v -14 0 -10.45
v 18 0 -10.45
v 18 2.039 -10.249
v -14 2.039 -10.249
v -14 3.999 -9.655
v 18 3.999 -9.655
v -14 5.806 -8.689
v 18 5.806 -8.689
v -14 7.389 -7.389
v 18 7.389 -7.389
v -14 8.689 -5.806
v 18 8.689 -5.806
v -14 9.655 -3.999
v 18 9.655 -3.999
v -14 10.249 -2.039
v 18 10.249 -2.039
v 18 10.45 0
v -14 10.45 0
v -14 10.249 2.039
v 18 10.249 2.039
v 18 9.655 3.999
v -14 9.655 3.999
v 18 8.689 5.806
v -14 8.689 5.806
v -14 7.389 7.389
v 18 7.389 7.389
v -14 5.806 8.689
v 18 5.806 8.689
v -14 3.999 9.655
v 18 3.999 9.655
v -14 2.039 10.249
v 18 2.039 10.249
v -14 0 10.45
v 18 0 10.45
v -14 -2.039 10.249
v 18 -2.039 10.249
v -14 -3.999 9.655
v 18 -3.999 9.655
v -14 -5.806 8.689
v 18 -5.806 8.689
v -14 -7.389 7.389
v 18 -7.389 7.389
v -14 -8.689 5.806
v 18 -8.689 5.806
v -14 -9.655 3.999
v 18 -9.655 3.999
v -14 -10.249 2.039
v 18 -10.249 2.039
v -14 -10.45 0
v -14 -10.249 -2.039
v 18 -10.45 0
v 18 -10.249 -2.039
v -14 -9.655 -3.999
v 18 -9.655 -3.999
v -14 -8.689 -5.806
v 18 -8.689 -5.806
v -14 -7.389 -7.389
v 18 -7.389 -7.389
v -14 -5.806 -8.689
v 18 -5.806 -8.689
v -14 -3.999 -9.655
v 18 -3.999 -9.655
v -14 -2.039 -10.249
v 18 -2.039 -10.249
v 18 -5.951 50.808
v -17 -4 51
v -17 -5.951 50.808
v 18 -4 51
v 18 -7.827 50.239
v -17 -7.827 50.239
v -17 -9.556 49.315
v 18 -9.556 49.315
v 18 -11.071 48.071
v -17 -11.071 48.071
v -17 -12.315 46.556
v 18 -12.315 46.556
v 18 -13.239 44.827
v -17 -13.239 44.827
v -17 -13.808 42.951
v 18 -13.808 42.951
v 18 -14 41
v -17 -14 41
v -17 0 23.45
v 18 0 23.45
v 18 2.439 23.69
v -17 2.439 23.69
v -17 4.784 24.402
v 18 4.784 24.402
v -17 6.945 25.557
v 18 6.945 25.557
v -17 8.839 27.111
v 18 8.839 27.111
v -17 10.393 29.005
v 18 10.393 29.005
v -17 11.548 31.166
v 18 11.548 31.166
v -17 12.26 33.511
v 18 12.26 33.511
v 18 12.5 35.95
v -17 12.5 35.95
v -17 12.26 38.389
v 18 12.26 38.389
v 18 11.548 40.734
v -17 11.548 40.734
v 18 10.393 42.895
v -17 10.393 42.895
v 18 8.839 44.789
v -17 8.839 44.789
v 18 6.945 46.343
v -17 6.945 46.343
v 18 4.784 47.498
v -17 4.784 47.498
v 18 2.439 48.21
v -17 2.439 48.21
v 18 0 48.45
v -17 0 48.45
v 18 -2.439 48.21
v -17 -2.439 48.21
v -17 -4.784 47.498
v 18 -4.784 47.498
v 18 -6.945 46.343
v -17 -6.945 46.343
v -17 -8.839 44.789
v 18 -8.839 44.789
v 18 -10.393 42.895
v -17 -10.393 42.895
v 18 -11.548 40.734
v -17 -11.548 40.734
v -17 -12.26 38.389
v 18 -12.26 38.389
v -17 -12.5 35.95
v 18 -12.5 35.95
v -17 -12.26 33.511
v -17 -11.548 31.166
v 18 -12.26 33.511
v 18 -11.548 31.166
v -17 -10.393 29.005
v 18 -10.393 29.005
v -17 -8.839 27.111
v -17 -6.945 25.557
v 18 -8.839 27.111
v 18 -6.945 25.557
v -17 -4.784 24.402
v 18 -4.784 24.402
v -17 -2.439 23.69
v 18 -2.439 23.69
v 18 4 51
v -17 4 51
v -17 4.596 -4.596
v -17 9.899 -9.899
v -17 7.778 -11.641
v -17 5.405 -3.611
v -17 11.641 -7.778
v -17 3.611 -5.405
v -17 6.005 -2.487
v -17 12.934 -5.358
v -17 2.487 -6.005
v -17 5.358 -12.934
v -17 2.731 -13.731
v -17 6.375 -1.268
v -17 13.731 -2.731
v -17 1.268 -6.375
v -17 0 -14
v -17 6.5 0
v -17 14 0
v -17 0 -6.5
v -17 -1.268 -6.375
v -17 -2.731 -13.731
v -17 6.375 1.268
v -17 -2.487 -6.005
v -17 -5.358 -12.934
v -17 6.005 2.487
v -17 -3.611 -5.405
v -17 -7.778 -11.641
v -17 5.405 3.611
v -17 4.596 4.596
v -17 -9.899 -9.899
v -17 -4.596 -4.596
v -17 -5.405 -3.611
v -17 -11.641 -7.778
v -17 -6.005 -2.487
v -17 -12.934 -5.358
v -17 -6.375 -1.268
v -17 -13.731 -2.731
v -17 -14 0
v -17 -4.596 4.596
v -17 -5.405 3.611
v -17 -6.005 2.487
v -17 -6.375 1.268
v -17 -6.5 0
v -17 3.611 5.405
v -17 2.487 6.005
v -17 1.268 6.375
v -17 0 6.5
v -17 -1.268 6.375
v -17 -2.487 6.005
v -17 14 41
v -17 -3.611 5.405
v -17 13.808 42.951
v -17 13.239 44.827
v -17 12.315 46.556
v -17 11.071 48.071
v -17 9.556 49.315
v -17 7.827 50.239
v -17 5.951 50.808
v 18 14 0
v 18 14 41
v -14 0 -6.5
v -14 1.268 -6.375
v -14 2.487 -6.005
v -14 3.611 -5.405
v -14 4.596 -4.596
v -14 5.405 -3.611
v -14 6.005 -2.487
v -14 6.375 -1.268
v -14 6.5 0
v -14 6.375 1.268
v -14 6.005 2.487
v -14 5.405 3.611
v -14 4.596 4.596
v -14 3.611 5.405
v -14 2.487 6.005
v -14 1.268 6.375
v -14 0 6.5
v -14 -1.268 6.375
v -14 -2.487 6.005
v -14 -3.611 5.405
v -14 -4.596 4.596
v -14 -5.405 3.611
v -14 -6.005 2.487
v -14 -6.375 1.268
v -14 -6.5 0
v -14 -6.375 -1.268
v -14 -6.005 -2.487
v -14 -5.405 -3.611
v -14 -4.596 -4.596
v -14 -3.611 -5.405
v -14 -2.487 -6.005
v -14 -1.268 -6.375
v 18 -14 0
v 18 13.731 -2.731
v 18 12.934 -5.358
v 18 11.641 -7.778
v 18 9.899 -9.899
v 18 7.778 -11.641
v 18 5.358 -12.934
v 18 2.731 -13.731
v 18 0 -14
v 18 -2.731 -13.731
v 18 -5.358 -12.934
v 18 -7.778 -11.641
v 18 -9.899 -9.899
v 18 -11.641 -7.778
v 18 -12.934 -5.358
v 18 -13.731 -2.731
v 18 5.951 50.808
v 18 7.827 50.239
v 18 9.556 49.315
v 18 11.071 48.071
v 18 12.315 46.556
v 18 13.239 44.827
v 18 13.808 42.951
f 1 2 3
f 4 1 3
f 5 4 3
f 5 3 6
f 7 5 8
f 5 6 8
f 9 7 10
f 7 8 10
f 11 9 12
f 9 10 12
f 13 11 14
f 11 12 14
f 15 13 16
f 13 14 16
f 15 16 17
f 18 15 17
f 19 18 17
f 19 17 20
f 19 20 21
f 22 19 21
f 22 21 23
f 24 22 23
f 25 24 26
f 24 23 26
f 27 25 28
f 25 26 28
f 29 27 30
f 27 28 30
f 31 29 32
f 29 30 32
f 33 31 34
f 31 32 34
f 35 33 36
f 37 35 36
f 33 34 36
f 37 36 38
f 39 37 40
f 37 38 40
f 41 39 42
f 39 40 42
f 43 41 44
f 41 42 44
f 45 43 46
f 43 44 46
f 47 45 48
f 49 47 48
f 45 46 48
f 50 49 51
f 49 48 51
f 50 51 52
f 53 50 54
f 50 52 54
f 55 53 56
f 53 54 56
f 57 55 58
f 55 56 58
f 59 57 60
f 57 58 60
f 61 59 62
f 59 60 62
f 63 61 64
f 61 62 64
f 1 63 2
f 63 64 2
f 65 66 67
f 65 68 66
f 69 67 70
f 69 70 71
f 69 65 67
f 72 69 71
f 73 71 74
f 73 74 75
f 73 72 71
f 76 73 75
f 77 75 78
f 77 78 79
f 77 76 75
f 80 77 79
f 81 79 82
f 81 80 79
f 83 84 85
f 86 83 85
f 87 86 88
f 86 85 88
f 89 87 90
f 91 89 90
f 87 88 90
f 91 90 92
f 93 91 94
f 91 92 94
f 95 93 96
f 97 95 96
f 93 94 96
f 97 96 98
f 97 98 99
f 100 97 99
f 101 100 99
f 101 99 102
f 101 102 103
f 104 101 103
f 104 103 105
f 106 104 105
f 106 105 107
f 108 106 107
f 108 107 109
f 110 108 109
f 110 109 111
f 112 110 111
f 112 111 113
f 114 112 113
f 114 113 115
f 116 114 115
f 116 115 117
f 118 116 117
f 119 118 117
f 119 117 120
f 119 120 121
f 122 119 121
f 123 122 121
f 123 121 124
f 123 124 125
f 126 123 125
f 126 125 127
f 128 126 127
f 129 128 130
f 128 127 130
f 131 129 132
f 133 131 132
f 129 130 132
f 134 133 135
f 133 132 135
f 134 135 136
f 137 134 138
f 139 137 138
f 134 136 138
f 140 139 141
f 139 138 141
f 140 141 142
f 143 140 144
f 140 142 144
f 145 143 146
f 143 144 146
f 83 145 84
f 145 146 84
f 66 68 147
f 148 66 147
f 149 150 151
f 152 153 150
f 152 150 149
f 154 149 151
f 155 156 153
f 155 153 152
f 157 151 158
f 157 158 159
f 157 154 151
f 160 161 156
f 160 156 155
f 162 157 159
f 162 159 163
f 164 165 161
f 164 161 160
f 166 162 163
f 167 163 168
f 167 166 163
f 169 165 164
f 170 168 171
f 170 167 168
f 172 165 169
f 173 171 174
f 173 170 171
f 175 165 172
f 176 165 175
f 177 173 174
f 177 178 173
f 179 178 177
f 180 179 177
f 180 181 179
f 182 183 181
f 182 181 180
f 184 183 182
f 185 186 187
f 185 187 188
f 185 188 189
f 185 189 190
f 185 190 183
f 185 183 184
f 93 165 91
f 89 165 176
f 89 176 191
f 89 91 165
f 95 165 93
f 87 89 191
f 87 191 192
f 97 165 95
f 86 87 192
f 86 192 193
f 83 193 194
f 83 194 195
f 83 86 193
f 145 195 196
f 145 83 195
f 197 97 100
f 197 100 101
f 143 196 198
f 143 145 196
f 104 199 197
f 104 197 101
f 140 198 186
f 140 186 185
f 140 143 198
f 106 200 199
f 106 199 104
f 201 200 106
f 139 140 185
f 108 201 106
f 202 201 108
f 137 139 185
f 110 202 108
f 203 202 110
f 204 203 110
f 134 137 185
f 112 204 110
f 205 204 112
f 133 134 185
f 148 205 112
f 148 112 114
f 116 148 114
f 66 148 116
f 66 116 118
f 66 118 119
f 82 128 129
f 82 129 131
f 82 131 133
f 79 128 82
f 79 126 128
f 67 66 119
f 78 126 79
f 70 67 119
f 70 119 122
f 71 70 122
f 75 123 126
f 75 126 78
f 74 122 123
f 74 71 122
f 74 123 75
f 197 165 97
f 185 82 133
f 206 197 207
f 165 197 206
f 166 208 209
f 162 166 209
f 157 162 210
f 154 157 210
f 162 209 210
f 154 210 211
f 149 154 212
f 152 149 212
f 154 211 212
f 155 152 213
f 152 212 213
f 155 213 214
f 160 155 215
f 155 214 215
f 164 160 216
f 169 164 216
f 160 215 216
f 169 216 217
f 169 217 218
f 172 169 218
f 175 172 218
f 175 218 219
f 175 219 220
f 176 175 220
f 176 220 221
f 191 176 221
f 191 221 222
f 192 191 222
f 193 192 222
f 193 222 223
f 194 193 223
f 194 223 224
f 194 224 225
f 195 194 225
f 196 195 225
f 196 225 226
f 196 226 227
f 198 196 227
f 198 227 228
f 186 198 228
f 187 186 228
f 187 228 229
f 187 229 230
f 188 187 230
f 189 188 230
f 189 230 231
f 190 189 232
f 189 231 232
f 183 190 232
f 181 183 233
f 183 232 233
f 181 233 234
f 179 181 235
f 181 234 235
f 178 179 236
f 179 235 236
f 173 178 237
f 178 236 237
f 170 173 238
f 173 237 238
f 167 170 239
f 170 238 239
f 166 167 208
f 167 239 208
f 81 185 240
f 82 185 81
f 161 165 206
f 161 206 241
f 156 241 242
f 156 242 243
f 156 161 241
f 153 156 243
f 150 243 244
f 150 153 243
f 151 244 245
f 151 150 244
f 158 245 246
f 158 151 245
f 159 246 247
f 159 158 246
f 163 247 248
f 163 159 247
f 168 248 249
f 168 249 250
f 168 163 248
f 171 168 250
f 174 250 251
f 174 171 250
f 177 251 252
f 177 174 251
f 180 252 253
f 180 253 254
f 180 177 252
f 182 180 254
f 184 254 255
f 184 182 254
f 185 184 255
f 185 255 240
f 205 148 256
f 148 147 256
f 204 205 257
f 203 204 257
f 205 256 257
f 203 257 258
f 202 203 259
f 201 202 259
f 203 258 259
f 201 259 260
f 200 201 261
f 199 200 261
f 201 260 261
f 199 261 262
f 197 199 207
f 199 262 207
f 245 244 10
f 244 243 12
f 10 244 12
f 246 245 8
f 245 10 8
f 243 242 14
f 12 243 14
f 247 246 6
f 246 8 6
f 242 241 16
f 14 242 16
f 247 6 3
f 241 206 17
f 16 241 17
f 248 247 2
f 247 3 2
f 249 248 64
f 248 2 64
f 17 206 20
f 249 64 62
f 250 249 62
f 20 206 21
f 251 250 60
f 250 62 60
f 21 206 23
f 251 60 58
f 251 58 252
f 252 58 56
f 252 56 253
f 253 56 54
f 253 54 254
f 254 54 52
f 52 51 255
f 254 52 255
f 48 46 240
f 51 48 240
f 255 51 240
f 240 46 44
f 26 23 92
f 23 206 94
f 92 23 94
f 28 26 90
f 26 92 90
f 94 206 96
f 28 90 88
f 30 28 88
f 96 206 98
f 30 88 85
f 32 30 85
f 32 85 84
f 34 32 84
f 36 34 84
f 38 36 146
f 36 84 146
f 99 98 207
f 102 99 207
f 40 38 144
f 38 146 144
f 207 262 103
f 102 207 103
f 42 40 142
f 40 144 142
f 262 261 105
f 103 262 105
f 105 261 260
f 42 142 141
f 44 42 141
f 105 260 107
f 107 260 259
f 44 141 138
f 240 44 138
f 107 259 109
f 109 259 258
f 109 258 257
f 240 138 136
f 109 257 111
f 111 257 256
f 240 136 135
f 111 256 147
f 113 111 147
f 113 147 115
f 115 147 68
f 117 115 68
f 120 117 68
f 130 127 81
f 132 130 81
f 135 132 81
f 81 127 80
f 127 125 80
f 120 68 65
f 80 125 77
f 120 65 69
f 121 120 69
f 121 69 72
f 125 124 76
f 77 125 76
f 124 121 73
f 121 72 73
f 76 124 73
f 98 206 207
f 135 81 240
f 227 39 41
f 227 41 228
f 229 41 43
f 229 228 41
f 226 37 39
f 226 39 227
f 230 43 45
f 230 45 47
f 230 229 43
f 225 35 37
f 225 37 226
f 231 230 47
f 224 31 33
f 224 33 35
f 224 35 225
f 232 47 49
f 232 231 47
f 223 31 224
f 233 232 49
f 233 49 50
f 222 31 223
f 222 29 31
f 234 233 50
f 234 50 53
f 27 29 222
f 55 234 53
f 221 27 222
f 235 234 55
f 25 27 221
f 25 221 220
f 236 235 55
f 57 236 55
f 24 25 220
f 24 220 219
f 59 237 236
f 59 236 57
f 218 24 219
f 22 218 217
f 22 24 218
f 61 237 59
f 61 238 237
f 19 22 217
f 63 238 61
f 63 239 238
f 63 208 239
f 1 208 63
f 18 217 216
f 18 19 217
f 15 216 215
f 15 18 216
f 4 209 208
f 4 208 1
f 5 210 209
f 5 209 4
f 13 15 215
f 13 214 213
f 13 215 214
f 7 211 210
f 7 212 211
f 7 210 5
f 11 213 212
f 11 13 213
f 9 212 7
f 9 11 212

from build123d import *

# Parameters (mm, degrees)
BOSS_EXTRUDE1_START = -17
BOSS_EXTRUDE1_DEPTH = 35
SKETCH2_R           = 10.45
CUT_EXTRUDE1_DEPTH  = 32
SKETCH3_R           = 6.5
CUT_EXTRUDE2_DEPTH  = 62.814237842
SKETCH4_R           = 12.5
CUT_EXTRUDE3_DEPTH  = 64.419239983
FILLET5_R           = 10
FILLET6_R           = 10


with BuildPart() as part:
    # Sketch1 → Boss-Extrude1 (new body)
    with BuildSketch(Plane.YZ.offset(BOSS_EXTRUDE1_START)):
        with BuildLine():
            Line((-14, 0), (-14, 51))
            Line((-14, 51), (14, 51))
            Line((14, 51), (14, 0))
            ThreePointArc((14, 0), (0, -14), (-14, 0))
        make_face()
    extrude(amount=BOSS_EXTRUDE1_DEPTH)

    # Sketch2 → Cut-Extrude1 (cut)
    with BuildSketch(Plane.YZ.offset(18)):
        with Locations(Location((0, 0, 0), (0, 0, 270))):
            Circle(SKETCH2_R)
    extrude(amount=-CUT_EXTRUDE1_DEPTH, mode=Mode.SUBTRACT)

    # Sketch3 → Cut-Extrude2 (cut, through all)
    with BuildSketch(Plane.YZ.offset(-14)):
        with Locations(Location((0, 0, 0), (0, 0, 270))):
            Circle(SKETCH3_R)
    extrude(amount=-CUT_EXTRUDE2_DEPTH, mode=Mode.SUBTRACT)

    # Sketch4 → Cut-Extrude3 (cut, through all)
    with BuildSketch(Plane.YZ.offset(18)):
        with Locations(Location((0, 35.95, 0), (0, 0, 270))):
            Circle(SKETCH4_R)
    extrude(amount=-CUT_EXTRUDE3_DEPTH, mode=Mode.SUBTRACT)

    # Fillet5
    fillet5_edges = [part.edges().sort_by_distance(p)[0] for p in [
        (0.5, 14, 51),
    ]]
    fillet(fillet5_edges, radius=FILLET5_R)

    # Fillet6
    fillet6_edges = [part.edges().sort_by_distance(p)[0] for p in [
        (0.5, -14, 51),
    ]]
    fillet(fillet6_edges, radius=FILLET6_R)


solid = part.part
